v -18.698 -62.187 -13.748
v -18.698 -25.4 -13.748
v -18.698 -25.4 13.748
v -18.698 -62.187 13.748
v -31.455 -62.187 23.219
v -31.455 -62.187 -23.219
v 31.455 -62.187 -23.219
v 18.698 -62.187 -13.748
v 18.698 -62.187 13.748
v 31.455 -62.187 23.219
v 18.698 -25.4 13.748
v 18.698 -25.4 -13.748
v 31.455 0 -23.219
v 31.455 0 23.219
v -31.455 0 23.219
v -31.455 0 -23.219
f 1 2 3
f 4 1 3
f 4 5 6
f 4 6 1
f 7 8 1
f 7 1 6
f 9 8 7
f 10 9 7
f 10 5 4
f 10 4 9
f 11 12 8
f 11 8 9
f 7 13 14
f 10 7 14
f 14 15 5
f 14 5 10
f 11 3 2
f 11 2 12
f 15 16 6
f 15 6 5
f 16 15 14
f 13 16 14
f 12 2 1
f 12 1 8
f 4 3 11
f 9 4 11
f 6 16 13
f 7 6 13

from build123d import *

# Parameters (mm, degrees)
F0_W     = 62.910616
F0_H     = 46.43853
F0_W_2   = 37.395
F0_H_2   = 27.496278
F1_DEPTH = 62.186921
F2_W     = 37.666064
F2_H     = 27.62061
F3_DEPTH = 25.4


with BuildPart() as f1:
    # F0 (on Front) → F1 (new body)
    with BuildSketch(Plane.XZ):
        Rectangle(F0_W, F0_H)
        Rectangle(F0_W_2, F0_H_2, mode=Mode.SUBTRACT)
    extrude(amount=F1_DEPTH)

    # F2 (on Front) → F3 (join)
    with BuildSketch(Plane.XZ):
        Rectangle(F2_W, F2_H)
    extrude(amount=F3_DEPTH)


solid = f1.part
